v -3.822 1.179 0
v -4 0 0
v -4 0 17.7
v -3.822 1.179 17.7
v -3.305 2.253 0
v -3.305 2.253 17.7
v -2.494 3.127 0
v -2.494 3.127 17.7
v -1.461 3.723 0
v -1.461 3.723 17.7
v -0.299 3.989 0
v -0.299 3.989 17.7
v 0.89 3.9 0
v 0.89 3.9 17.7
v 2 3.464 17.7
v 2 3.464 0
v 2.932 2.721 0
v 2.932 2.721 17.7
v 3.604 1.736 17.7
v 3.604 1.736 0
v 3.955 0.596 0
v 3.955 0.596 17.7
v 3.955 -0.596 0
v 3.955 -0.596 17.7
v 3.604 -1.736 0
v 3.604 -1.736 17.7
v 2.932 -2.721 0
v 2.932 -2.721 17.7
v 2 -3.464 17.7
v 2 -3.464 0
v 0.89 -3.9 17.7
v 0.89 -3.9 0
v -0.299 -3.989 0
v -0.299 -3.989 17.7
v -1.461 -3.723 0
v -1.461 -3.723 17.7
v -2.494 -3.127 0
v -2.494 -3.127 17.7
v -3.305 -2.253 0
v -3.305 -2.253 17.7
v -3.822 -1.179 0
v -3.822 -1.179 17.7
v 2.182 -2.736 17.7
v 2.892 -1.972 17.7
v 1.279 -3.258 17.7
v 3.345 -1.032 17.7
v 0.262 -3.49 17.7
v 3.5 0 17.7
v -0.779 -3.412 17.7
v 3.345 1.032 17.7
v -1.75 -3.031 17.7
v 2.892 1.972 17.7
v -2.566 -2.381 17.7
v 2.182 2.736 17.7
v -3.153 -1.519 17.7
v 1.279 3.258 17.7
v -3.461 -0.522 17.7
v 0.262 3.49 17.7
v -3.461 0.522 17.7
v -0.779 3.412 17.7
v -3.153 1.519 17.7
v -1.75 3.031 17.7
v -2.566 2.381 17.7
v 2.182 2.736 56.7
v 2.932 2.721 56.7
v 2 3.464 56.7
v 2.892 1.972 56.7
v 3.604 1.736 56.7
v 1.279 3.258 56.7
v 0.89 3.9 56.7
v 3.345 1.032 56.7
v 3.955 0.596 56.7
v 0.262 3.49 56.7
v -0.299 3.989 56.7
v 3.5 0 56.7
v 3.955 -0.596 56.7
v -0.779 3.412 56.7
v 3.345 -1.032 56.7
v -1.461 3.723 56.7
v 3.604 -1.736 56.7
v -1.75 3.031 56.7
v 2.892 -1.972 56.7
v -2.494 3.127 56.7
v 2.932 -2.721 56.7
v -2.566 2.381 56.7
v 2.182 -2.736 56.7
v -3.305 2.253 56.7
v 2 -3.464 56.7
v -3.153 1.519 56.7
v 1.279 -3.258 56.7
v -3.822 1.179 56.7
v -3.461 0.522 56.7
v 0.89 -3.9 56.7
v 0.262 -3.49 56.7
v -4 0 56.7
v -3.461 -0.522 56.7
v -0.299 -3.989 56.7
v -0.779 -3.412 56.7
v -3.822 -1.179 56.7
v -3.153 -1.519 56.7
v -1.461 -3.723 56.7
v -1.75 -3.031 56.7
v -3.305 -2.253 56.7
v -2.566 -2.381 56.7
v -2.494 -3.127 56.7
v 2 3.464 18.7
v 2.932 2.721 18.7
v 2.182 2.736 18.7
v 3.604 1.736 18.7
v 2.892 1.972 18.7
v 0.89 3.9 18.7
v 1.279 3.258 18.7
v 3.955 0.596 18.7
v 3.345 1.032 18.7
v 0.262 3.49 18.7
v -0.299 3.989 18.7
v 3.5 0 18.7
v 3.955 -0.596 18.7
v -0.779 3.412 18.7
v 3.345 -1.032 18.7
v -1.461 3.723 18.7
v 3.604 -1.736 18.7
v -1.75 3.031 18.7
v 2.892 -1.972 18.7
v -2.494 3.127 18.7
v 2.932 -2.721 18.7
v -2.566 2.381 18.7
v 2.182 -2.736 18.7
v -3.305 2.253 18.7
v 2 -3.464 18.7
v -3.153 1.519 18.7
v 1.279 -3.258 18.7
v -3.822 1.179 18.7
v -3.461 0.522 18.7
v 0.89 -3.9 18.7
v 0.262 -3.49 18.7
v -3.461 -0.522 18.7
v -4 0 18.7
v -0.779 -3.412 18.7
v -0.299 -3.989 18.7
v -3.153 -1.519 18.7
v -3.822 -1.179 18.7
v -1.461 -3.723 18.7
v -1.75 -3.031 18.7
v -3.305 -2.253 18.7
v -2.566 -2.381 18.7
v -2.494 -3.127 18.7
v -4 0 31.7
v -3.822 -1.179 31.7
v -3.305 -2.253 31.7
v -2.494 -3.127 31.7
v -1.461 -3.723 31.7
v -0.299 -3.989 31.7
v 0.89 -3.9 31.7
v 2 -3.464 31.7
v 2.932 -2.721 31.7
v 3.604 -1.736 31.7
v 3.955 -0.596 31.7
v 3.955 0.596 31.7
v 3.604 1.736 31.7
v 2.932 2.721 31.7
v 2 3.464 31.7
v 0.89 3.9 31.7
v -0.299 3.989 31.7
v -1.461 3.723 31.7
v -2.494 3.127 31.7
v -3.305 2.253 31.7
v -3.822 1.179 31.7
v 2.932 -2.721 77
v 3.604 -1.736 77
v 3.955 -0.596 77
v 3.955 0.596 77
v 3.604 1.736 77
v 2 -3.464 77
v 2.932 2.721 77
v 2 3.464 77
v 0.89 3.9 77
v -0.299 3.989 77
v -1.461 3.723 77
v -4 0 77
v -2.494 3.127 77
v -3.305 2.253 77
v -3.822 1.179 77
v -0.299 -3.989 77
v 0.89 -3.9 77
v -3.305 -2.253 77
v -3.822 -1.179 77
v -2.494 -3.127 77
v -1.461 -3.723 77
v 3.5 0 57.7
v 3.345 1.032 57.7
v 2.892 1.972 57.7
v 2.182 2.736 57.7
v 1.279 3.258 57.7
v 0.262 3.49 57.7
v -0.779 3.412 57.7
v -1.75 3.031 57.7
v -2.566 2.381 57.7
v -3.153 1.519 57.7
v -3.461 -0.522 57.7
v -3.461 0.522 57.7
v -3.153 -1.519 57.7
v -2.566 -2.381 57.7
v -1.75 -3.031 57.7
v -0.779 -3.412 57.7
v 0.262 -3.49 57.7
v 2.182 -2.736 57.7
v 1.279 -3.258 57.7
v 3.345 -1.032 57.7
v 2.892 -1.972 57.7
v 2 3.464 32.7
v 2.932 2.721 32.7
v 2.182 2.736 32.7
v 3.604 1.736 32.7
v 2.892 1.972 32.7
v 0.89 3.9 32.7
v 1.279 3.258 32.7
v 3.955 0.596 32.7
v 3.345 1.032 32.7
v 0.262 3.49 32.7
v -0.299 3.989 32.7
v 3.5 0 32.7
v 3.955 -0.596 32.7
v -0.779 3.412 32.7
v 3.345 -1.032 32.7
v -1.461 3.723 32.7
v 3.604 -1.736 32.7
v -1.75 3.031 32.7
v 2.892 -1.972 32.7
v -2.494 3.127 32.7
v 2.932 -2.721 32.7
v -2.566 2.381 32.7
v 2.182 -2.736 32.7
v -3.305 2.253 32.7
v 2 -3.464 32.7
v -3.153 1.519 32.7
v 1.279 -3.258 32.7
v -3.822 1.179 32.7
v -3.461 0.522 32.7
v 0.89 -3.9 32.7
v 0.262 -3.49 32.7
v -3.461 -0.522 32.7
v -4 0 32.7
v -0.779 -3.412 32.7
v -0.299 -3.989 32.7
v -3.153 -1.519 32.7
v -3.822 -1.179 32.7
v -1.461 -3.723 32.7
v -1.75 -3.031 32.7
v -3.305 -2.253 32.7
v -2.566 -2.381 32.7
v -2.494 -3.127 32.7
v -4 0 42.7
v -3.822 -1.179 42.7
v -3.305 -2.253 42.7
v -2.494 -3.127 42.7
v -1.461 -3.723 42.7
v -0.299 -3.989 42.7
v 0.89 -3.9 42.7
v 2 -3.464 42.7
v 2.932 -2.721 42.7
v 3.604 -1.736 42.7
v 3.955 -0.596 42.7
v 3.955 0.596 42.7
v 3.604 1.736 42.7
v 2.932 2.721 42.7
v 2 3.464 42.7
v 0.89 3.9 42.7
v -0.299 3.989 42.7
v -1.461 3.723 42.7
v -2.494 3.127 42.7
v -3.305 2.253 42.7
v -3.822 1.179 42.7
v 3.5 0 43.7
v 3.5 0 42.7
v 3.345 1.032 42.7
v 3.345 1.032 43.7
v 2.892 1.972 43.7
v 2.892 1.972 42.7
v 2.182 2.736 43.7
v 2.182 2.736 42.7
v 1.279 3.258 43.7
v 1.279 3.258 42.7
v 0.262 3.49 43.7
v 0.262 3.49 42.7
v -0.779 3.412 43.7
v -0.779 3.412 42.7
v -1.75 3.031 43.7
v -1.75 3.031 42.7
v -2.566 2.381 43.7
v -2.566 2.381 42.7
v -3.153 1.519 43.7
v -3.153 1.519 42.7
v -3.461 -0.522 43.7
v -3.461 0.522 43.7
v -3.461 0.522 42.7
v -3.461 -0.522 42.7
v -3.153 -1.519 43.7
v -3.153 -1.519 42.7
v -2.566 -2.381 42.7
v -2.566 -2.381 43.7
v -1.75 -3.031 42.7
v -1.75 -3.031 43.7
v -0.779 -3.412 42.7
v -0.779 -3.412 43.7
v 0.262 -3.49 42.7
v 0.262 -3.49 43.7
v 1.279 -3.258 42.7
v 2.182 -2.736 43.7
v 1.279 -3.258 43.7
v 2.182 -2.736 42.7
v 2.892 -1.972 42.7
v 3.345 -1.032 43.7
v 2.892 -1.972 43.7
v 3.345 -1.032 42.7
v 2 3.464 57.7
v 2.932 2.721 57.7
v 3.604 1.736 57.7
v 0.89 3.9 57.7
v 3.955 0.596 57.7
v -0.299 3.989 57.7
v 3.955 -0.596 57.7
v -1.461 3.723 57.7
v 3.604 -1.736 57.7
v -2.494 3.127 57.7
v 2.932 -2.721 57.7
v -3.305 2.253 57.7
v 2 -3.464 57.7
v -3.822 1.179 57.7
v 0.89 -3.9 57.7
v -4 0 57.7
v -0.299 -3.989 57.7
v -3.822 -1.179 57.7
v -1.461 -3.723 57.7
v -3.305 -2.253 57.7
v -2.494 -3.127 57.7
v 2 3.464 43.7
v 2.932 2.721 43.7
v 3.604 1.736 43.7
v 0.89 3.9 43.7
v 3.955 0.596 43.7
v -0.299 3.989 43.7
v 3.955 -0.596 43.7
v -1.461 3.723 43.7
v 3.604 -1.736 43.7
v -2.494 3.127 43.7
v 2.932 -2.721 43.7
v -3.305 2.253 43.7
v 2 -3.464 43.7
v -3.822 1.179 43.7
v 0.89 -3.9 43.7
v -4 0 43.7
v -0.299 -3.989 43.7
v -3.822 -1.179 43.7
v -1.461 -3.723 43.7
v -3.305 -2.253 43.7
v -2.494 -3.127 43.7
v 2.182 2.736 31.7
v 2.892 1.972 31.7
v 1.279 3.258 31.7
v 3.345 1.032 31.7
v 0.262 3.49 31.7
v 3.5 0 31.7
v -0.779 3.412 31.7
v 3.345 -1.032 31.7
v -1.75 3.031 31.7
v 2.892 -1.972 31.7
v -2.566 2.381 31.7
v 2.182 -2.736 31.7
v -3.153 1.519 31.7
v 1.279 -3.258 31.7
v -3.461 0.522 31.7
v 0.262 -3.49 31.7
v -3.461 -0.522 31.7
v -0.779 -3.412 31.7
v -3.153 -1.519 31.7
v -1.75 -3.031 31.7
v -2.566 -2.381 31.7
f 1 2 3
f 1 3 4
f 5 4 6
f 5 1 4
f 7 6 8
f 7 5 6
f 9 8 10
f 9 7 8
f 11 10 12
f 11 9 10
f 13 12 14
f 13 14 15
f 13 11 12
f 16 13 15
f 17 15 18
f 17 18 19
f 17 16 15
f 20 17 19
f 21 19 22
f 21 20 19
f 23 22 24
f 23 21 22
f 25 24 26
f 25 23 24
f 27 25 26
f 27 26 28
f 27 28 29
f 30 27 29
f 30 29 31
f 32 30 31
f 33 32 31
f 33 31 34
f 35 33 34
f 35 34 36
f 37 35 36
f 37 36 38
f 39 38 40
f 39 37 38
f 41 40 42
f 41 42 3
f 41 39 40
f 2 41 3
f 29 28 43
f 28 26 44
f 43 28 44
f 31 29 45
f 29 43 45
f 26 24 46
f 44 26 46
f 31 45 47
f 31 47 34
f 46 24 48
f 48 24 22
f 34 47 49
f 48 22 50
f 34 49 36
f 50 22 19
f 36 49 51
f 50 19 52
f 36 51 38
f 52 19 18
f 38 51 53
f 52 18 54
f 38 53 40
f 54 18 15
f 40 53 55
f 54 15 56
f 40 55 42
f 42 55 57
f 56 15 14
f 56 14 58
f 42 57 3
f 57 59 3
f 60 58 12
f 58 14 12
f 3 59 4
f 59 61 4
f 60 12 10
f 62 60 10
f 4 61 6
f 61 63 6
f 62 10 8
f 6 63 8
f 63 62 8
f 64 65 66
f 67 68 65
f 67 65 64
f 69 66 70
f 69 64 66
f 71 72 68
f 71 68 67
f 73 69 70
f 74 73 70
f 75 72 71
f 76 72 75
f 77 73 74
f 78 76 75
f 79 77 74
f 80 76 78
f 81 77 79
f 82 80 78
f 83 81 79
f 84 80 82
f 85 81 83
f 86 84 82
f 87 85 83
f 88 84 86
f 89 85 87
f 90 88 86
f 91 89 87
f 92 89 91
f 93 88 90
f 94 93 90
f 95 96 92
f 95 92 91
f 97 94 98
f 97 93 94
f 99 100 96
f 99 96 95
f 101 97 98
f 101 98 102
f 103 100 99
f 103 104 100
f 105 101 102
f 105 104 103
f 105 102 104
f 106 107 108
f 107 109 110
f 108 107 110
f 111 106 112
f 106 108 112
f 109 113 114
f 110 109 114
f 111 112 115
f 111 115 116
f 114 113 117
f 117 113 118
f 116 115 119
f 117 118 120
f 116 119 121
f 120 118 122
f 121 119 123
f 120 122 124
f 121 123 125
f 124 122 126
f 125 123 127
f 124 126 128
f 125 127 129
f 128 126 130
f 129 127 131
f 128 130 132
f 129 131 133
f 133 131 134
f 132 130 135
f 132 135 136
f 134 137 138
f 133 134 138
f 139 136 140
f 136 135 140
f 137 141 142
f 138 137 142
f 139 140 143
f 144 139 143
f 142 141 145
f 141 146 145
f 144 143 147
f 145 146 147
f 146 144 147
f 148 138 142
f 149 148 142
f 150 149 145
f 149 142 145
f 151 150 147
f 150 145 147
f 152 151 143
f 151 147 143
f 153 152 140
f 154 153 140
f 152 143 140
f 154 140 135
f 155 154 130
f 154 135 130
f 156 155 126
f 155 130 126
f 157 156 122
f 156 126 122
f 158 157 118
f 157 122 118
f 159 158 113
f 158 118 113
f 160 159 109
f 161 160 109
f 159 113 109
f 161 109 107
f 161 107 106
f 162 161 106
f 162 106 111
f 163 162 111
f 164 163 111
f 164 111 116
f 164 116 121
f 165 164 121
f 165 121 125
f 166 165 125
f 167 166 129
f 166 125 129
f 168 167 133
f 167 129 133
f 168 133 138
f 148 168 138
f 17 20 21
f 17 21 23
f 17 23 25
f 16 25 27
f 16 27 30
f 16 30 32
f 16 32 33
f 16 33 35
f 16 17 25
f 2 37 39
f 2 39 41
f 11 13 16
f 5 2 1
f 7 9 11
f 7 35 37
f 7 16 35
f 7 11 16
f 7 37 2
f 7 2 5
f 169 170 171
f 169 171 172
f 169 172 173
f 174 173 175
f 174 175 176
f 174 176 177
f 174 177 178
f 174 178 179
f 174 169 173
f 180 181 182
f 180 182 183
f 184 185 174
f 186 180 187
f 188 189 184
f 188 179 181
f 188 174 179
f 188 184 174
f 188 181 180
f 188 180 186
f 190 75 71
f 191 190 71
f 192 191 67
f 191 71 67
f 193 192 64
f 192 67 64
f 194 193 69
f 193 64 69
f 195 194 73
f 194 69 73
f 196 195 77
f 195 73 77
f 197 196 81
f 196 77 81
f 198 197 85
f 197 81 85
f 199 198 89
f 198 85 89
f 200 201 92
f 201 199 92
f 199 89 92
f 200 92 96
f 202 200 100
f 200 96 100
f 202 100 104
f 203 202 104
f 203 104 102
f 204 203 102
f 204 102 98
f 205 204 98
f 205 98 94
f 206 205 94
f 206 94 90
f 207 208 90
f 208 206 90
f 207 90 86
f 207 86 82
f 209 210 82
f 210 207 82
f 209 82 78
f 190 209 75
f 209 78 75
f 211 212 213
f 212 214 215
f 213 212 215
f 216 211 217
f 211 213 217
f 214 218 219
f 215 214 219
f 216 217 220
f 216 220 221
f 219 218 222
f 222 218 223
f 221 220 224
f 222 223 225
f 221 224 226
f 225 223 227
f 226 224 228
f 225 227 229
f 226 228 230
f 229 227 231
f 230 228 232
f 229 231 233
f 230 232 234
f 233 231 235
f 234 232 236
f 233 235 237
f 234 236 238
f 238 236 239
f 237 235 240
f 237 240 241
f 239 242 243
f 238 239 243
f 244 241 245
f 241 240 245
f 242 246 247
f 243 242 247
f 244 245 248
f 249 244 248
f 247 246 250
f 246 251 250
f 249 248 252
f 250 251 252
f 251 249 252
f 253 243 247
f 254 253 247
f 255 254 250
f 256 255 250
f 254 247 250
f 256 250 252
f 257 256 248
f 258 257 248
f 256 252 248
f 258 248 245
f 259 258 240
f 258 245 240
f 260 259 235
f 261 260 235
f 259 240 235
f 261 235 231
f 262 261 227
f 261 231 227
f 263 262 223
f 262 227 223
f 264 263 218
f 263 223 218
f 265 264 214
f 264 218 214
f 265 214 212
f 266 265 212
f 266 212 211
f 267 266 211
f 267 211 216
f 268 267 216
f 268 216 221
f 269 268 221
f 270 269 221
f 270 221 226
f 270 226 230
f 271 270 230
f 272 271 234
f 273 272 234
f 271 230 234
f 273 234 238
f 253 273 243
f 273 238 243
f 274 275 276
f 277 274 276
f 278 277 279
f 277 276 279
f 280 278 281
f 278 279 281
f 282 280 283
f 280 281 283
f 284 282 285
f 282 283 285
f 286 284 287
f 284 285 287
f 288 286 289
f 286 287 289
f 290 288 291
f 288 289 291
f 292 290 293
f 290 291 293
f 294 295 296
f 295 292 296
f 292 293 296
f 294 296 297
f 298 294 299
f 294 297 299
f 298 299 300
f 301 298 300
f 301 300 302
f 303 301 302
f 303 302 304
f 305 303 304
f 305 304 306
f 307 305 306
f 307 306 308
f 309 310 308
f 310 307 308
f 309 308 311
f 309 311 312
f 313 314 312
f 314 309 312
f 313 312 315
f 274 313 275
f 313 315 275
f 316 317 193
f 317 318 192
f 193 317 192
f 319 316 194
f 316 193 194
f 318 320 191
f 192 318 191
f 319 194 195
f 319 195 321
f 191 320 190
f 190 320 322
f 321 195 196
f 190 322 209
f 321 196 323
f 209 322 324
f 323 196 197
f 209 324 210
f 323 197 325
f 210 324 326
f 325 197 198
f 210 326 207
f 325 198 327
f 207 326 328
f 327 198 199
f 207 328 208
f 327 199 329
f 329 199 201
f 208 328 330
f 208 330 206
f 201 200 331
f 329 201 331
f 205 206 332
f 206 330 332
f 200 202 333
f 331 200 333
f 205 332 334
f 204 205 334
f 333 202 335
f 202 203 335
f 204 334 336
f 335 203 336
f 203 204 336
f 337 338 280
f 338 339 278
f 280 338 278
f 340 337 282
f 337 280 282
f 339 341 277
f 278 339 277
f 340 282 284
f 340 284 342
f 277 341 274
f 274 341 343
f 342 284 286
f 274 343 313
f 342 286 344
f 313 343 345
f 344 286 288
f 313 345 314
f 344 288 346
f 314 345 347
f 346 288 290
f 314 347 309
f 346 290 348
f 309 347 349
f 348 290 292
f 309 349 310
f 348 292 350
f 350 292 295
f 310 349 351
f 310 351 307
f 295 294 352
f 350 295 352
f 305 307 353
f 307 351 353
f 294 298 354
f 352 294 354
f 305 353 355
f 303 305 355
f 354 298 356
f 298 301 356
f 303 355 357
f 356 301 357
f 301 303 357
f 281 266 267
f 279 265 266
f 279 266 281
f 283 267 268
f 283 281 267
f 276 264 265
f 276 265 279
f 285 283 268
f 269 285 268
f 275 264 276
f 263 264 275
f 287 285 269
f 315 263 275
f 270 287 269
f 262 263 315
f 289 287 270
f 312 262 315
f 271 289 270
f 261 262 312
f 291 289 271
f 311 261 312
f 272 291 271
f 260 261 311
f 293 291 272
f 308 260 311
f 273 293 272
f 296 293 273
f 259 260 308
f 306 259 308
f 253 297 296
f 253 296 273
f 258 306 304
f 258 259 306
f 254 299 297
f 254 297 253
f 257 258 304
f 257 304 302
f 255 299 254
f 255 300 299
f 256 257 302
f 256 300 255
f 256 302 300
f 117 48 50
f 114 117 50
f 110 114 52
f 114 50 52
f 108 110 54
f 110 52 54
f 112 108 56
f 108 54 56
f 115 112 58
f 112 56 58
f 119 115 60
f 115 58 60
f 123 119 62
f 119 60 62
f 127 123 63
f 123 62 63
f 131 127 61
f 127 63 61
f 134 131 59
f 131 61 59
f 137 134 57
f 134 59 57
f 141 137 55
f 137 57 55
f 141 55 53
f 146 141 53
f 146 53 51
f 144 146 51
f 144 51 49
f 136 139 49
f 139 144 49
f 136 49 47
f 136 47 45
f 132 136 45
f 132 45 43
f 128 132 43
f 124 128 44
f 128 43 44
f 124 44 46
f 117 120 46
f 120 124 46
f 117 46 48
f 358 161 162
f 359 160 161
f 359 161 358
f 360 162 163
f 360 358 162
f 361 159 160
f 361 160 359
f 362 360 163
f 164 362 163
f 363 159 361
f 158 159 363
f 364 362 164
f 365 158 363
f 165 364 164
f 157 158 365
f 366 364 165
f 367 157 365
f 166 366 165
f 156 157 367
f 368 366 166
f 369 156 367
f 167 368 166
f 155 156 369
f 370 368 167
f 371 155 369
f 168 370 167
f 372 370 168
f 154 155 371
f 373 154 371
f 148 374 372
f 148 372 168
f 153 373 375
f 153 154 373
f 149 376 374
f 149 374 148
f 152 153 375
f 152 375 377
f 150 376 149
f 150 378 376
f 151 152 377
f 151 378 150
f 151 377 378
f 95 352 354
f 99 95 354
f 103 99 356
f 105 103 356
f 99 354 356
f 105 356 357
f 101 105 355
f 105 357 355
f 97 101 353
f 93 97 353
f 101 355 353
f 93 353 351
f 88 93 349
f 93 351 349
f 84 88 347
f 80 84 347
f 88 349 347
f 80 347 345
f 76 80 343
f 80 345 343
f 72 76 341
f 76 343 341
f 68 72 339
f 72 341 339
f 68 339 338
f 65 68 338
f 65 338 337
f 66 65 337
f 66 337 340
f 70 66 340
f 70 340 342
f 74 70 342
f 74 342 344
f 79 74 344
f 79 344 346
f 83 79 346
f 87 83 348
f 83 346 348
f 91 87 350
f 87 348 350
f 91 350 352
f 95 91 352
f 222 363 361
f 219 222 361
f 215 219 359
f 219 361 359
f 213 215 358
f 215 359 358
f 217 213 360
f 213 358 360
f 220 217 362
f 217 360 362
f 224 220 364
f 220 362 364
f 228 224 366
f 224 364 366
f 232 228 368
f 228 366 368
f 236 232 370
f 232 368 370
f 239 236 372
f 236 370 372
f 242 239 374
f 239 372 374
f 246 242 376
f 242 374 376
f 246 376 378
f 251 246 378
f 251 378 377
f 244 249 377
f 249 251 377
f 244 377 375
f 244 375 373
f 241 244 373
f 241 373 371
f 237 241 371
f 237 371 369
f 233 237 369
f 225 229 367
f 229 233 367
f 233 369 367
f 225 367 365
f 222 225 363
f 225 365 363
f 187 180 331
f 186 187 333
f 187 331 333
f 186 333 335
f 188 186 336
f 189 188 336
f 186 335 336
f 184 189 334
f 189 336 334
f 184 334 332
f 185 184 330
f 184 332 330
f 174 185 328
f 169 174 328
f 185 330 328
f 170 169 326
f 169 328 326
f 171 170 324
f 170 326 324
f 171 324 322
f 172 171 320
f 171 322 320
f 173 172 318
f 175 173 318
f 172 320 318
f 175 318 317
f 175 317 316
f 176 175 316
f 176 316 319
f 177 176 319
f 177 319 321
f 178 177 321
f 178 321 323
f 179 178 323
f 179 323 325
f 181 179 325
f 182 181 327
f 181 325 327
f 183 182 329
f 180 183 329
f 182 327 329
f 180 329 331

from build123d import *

# Parameters (mm, degrees)
SKETCH1_R           = 3.5
BOSS_EXTRUDE1_DEPTH = 77
SKETCH3_R           = 4
SKETCH3_R_2         = 3.5
BOSS_EXTRUDE2_DEPTH = 17.7
SKETCH6_R           = 4
SKETCH6_R_2         = 3
BOSS_EXTRUDE3_DEPTH = 13
SKETCH7_R           = 4
SKETCH7_R_2         = 3
BOSS_EXTRUDE4_DEPTH = 10
SKETCH8_R           = 4
SKETCH8_R_2         = 3
BOSS_EXTRUDE5_DEPTH = 13
SKETCH9_R           = 4
SKETCH9_R_2         = 3
BOSS_EXTRUDE6_DEPTH = 19.3


with BuildPart() as part:
    # Sketch1 → Boss-Extrude1 (new body)
    with BuildSketch(Plane.XY):
        Circle(SKETCH1_R)
    extrude(amount=BOSS_EXTRUDE1_DEPTH)

    # Sketch3 → Boss-Extrude2 (add)
    with BuildSketch(Plane(origin=(0, 0, 0), x_dir=(-1, 0, 0), z_dir=(0, 0, -1))):
        Circle(SKETCH3_R)
        Circle(SKETCH3_R_2, mode=Mode.SUBTRACT)
    extrude(amount=-BOSS_EXTRUDE2_DEPTH)

    # Sketch6 → Boss-Extrude3 (add)
    with BuildSketch(Plane.XY.offset(18.7)):
        with Locations(Location((0, 0, 0), (0, 0, 180))):
            Circle(SKETCH6_R)
        Circle(SKETCH6_R_2, mode=Mode.SUBTRACT)
    extrude(amount=BOSS_EXTRUDE3_DEPTH)

    # Sketch7 → Boss-Extrude4 (add)
    with BuildSketch(Plane.XY.offset(32.7)):
        with Locations(Location((0, 0, 0), (0, 0, 180))):
            Circle(SKETCH7_R)
        Circle(SKETCH7_R_2, mode=Mode.SUBTRACT)
    extrude(amount=BOSS_EXTRUDE4_DEPTH)

    # Sketch8 → Boss-Extrude5 (add)
    with BuildSketch(Plane.XY.offset(43.7)):
        with Locations(Location((0, 0, 0), (0, 0, 180))):
            Circle(SKETCH8_R)
        Circle(SKETCH8_R_2, mode=Mode.SUBTRACT)
    extrude(amount=BOSS_EXTRUDE5_DEPTH)

    # Sketch9 → Boss-Extrude6 (add)
    with BuildSketch(Plane.XY.offset(57.7)):
        with Locations(Location((0, 0, 0), (0, 0, 180))):
            Circle(SKETCH9_R)
        Circle(SKETCH9_R_2, mode=Mode.SUBTRACT)
    extrude(amount=BOSS_EXTRUDE6_DEPTH)


solid = part.part
